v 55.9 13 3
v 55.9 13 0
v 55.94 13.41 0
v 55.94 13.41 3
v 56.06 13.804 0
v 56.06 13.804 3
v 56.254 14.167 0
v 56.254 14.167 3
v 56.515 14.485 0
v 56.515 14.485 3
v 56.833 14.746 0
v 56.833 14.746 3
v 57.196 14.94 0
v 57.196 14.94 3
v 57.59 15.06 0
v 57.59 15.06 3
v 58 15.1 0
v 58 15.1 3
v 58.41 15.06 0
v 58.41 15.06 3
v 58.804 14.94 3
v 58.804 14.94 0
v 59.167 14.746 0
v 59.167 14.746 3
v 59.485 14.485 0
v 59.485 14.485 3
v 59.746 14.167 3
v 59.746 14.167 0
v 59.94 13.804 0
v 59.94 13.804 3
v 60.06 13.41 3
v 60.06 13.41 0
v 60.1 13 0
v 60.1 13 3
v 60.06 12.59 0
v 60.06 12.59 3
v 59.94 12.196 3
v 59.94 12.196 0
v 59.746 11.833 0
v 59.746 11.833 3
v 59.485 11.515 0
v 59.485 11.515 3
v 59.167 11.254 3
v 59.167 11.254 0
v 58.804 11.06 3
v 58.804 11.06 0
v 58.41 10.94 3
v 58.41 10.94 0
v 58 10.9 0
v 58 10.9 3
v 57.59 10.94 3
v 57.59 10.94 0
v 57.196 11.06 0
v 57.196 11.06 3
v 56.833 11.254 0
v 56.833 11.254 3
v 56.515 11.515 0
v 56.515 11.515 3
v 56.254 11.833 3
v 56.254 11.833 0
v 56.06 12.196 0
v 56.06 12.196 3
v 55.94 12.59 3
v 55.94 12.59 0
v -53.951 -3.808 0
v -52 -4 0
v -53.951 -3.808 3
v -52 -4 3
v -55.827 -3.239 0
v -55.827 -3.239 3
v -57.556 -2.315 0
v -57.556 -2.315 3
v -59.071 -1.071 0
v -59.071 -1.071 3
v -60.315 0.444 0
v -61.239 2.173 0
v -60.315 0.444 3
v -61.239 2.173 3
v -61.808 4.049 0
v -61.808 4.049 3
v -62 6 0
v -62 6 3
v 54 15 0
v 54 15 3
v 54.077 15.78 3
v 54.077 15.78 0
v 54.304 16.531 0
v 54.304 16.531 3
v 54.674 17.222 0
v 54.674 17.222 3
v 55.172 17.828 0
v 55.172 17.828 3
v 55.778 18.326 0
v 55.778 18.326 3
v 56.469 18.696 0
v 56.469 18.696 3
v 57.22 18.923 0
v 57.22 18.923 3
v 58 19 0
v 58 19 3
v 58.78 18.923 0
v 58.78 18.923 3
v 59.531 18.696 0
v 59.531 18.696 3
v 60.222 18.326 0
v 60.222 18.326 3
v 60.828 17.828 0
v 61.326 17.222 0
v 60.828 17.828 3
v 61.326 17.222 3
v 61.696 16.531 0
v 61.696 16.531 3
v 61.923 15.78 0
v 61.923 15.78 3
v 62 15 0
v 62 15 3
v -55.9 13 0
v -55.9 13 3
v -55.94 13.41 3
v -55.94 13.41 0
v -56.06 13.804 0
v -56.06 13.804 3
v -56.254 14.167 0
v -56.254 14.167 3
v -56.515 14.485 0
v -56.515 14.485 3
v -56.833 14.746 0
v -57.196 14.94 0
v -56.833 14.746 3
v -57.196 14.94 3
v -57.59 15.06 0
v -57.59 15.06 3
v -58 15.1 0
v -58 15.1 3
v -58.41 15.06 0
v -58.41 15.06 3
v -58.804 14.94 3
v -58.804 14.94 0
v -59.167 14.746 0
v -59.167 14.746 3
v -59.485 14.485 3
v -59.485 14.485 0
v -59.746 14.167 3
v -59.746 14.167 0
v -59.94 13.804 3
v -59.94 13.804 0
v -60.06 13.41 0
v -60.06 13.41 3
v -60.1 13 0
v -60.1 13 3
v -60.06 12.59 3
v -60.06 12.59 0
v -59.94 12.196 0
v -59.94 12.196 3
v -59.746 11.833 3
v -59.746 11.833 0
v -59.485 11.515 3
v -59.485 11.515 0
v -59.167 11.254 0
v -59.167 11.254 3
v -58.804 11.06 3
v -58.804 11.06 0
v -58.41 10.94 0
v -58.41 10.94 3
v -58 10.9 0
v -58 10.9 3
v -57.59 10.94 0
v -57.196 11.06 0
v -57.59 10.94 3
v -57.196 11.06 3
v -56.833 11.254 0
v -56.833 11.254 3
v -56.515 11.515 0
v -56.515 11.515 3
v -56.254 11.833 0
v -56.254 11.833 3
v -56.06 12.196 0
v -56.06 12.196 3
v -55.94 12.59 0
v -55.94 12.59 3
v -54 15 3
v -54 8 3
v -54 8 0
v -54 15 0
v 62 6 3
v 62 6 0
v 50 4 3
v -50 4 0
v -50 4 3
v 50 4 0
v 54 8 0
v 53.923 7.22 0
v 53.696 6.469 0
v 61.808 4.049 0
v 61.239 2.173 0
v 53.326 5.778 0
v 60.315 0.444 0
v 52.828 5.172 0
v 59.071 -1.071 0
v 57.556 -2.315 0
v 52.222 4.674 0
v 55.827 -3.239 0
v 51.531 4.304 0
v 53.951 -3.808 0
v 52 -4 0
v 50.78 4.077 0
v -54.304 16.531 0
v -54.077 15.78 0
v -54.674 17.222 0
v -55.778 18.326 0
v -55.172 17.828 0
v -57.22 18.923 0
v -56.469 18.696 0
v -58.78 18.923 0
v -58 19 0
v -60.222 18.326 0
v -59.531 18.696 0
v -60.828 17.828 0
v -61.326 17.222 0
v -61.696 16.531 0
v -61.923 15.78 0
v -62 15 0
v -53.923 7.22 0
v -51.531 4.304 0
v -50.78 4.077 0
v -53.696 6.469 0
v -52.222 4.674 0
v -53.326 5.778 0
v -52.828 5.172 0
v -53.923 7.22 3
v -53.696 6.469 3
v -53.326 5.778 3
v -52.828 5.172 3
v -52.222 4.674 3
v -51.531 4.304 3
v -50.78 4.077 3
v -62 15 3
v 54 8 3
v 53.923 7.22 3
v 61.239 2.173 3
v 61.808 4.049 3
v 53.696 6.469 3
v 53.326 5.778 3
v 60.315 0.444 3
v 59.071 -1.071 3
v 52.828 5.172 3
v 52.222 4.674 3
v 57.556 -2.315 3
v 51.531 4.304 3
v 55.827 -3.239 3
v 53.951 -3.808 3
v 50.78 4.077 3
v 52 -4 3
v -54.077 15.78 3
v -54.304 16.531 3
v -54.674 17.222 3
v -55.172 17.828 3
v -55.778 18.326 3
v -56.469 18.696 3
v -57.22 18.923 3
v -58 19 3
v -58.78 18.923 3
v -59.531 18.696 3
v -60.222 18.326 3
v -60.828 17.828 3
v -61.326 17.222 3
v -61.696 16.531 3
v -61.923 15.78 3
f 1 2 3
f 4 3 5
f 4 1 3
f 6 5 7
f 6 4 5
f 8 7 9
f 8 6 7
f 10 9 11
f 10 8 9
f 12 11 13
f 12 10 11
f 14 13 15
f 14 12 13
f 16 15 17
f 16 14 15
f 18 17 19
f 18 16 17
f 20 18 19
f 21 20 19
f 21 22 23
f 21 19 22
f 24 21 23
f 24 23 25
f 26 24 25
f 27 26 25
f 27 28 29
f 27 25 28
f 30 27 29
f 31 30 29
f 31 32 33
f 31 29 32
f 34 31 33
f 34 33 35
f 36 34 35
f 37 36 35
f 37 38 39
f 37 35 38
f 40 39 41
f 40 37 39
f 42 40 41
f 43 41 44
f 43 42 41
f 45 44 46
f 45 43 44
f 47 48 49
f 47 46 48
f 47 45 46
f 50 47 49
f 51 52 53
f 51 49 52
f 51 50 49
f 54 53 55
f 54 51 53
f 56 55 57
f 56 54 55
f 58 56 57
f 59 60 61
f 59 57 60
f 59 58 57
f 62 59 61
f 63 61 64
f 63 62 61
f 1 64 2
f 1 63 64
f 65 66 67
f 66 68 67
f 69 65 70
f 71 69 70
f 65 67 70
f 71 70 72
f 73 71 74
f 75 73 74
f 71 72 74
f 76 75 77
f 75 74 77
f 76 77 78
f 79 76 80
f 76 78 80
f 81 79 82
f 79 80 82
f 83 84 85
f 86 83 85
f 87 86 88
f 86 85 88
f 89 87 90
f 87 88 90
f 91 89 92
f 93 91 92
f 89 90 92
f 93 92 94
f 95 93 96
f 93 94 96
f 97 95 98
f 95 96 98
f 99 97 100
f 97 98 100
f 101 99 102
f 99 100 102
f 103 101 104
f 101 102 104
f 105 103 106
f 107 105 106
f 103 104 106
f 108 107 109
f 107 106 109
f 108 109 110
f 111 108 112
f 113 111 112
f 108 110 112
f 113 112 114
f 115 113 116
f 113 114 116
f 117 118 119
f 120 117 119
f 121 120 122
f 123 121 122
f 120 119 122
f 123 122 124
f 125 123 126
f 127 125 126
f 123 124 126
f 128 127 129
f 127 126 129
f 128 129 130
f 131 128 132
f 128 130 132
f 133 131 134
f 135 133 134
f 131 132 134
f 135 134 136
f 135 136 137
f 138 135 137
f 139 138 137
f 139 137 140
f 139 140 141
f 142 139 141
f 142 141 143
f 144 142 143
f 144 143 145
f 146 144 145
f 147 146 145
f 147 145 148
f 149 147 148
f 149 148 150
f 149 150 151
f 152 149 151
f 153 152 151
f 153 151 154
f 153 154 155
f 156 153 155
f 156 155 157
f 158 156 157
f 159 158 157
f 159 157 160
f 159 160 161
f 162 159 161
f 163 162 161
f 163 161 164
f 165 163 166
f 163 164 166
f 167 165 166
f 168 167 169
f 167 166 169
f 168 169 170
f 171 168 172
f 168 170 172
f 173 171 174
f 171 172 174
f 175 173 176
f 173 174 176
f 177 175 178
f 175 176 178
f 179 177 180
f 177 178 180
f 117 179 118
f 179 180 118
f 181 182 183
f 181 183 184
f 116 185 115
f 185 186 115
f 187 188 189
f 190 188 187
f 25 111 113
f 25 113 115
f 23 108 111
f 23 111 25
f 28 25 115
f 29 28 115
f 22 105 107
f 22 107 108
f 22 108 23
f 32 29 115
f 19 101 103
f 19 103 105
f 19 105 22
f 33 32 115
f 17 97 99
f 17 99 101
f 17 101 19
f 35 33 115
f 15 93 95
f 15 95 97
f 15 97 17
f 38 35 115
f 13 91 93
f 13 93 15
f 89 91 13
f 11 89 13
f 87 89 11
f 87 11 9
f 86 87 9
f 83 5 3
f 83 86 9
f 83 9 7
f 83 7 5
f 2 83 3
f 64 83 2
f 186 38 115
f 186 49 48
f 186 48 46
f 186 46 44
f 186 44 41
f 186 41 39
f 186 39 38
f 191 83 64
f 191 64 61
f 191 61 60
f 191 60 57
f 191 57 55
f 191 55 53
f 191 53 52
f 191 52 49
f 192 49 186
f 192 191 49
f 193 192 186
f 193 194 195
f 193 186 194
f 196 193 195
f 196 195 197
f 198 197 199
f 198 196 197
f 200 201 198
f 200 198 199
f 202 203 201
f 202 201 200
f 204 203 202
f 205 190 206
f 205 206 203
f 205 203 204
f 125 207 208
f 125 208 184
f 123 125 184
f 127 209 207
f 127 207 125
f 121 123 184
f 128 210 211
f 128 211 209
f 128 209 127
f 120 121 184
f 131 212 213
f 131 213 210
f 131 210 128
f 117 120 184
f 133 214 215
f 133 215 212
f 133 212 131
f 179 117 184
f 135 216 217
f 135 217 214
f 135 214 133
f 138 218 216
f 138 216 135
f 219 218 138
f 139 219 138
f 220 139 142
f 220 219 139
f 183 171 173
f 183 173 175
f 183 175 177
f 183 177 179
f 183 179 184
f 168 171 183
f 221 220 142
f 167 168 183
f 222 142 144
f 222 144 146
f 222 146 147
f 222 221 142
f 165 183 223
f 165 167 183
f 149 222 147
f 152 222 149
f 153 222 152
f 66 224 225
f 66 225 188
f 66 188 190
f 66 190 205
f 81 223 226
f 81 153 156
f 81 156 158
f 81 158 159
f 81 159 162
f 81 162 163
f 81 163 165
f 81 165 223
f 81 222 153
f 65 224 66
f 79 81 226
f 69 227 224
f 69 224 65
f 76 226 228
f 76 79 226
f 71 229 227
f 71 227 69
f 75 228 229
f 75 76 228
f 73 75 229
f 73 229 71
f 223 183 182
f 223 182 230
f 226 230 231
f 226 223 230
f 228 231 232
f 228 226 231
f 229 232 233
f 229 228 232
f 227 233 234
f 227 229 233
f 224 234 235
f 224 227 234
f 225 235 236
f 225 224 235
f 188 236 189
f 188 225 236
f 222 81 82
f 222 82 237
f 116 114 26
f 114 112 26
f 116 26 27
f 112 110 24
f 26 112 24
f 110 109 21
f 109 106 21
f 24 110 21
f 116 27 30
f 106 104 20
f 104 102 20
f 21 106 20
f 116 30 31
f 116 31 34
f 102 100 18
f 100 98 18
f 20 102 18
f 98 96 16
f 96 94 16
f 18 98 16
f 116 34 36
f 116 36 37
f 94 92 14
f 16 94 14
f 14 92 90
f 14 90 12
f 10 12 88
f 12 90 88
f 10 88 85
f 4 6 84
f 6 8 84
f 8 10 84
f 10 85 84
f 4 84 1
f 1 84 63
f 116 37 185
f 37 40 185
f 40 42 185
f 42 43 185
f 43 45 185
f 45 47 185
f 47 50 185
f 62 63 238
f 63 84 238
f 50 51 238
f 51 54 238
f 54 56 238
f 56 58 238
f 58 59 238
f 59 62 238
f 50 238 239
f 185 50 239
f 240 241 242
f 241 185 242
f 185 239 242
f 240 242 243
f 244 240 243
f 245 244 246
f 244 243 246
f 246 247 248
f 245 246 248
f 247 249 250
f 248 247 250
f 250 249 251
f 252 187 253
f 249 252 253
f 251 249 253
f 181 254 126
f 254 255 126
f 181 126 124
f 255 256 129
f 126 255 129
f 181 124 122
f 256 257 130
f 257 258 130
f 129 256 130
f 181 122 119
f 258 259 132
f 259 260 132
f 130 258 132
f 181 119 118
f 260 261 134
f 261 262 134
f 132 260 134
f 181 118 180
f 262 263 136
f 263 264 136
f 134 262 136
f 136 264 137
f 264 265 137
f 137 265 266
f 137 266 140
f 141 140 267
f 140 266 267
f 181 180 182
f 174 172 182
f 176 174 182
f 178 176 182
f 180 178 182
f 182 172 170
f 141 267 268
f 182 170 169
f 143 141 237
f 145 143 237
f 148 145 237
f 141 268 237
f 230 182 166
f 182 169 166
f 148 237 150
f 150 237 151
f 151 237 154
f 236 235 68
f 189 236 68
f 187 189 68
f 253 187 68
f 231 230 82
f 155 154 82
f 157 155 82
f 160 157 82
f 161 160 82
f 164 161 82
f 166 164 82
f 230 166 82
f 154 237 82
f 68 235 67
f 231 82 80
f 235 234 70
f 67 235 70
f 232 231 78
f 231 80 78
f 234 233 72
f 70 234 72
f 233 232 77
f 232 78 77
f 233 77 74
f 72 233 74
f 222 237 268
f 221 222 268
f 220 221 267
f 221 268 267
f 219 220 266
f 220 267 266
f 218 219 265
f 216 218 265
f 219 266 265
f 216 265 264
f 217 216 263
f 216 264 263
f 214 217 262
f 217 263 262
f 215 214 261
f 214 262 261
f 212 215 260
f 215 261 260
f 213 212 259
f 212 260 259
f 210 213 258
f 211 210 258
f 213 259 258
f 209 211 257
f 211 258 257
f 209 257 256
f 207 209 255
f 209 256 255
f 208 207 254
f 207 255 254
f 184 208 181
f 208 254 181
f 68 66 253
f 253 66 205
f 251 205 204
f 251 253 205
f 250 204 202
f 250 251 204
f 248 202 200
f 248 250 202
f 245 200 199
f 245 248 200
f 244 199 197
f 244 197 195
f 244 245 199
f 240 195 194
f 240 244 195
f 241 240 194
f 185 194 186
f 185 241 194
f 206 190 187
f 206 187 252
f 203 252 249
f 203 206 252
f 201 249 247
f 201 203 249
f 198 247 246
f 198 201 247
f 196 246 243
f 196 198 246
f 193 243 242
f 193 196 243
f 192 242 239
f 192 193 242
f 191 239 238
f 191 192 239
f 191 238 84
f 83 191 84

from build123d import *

# Parameters (mm, degrees)
SKETCH_1_W          = 124
SKETCH_1_H          = 8
EXTRUDE_1_DEPTH     = 3
SKETCH_2_W          = 8
SKETCH_2_H          = 23
EXTRUDE_2_DEPTH     = 3
SKETCH_3_R          = 2.1
CUT_EXTRUDE_1_DEPTH = 65.915329468
FILLET_1_R          = 10
FILLET_2_R          = 4


with BuildPart() as part:
    # 草圖1 → 填料-伸長1 (new body)
    with BuildSketch(Plane.XY):
        Rectangle(SKETCH_1_W, SKETCH_1_H)
    extrude(amount=EXTRUDE_1_DEPTH)

    # 草圖2 → 填料-伸長2 (add)
    with BuildSketch(Plane.XY.offset(3)):
        with Locations((-58, 7.5)):
            Rectangle(SKETCH_2_W, SKETCH_2_H)
    extrude_2 = extrude(amount=-EXTRUDE_2_DEPTH)

    # 草圖3 → 除料-伸長1 (cut, through all)
    with BuildSketch(Plane.XY.offset(3)):
        with Locations((-58, 13)):
            Circle(SKETCH_3_R)
    cut_extrude_1 = extrude(amount=-CUT_EXTRUDE_1_DEPTH, mode=Mode.SUBTRACT)

    # 鏡射1: 填料-伸長2, 除料-伸長1 across plane
    add(extrude_2.mirror(Plane(origin=(0, 0, 0), x_dir=(0, 0, 1), z_dir=(1, 0, 0))))
    add(cut_extrude_1.mirror(Plane(origin=(0, 0, 0), x_dir=(0, 0, 1), z_dir=(1, 0, 0))), mode=Mode.SUBTRACT)

    # 圓角1
    fillet_1_edges = [part.edges().sort_by_distance(p)[0] for p in [
        (62, -4, 1.5),
        (-62, -4, 1.5),
    ]]
    fillet(fillet_1_edges, radius=FILLET_1_R)

    # 圓角2
    # the kernel refuses this fillet: 4 mm, written as the material it adds along each edge
    with BuildSketch(Plane(origin=(-54, 4, 0), x_dir=(0, 1, 0), z_dir=(0, 0, 1)), Plane(origin=(54, 4, 0), x_dir=(-1, 0, 0), z_dir=(0, 0, 1))) as fillet_2_piece_1:
        with BuildLine():
            CenterArc((FILLET_2_R, -FILLET_2_R), FILLET_2_R, 90, 90)
            Line((0, -FILLET_2_R), (0, 0))
            Line((0, 0), (FILLET_2_R, 0))
        make_face()
    extrude(amount=3)
    # the kernel refuses this fillet: 4 mm, written as the material it takes off along each edge
    with BuildSketch(Plane(origin=(62, 19, 13), x_dir=(0, -1, 0), z_dir=(0, 0, -1))) as fillet_2_2_piece_1:
        with BuildLine():
            CenterArc((FILLET_2_R, FILLET_2_R), FILLET_2_R, 180, 90)
            Line((0, FILLET_2_R), (0, 0))
            Line((0, 0), (FILLET_2_R, 0))
        make_face()
    extrude(amount=23, mode=Mode.SUBTRACT)
    with BuildSketch(Plane(origin=(54, 19, 13), x_dir=(0, -1, 0), z_dir=(0, 0, -1)), Plane(origin=(-54, 19, 13), x_dir=(-1, 0, 0), z_dir=(0, 0, -1)), Plane(origin=(-62, 19, 13), x_dir=(0, -1, 0), z_dir=(0, 0, -1))) as fillet_2_2_piece_2:
        with BuildLine():
            CenterArc((FILLET_2_R, -FILLET_2_R), FILLET_2_R, 90, 90)
            Line((0, -FILLET_2_R), (0, 0))
            Line((0, 0), (FILLET_2_R, 0))
        make_face()
    extrude(amount=23, mode=Mode.SUBTRACT)


solid = part.part
